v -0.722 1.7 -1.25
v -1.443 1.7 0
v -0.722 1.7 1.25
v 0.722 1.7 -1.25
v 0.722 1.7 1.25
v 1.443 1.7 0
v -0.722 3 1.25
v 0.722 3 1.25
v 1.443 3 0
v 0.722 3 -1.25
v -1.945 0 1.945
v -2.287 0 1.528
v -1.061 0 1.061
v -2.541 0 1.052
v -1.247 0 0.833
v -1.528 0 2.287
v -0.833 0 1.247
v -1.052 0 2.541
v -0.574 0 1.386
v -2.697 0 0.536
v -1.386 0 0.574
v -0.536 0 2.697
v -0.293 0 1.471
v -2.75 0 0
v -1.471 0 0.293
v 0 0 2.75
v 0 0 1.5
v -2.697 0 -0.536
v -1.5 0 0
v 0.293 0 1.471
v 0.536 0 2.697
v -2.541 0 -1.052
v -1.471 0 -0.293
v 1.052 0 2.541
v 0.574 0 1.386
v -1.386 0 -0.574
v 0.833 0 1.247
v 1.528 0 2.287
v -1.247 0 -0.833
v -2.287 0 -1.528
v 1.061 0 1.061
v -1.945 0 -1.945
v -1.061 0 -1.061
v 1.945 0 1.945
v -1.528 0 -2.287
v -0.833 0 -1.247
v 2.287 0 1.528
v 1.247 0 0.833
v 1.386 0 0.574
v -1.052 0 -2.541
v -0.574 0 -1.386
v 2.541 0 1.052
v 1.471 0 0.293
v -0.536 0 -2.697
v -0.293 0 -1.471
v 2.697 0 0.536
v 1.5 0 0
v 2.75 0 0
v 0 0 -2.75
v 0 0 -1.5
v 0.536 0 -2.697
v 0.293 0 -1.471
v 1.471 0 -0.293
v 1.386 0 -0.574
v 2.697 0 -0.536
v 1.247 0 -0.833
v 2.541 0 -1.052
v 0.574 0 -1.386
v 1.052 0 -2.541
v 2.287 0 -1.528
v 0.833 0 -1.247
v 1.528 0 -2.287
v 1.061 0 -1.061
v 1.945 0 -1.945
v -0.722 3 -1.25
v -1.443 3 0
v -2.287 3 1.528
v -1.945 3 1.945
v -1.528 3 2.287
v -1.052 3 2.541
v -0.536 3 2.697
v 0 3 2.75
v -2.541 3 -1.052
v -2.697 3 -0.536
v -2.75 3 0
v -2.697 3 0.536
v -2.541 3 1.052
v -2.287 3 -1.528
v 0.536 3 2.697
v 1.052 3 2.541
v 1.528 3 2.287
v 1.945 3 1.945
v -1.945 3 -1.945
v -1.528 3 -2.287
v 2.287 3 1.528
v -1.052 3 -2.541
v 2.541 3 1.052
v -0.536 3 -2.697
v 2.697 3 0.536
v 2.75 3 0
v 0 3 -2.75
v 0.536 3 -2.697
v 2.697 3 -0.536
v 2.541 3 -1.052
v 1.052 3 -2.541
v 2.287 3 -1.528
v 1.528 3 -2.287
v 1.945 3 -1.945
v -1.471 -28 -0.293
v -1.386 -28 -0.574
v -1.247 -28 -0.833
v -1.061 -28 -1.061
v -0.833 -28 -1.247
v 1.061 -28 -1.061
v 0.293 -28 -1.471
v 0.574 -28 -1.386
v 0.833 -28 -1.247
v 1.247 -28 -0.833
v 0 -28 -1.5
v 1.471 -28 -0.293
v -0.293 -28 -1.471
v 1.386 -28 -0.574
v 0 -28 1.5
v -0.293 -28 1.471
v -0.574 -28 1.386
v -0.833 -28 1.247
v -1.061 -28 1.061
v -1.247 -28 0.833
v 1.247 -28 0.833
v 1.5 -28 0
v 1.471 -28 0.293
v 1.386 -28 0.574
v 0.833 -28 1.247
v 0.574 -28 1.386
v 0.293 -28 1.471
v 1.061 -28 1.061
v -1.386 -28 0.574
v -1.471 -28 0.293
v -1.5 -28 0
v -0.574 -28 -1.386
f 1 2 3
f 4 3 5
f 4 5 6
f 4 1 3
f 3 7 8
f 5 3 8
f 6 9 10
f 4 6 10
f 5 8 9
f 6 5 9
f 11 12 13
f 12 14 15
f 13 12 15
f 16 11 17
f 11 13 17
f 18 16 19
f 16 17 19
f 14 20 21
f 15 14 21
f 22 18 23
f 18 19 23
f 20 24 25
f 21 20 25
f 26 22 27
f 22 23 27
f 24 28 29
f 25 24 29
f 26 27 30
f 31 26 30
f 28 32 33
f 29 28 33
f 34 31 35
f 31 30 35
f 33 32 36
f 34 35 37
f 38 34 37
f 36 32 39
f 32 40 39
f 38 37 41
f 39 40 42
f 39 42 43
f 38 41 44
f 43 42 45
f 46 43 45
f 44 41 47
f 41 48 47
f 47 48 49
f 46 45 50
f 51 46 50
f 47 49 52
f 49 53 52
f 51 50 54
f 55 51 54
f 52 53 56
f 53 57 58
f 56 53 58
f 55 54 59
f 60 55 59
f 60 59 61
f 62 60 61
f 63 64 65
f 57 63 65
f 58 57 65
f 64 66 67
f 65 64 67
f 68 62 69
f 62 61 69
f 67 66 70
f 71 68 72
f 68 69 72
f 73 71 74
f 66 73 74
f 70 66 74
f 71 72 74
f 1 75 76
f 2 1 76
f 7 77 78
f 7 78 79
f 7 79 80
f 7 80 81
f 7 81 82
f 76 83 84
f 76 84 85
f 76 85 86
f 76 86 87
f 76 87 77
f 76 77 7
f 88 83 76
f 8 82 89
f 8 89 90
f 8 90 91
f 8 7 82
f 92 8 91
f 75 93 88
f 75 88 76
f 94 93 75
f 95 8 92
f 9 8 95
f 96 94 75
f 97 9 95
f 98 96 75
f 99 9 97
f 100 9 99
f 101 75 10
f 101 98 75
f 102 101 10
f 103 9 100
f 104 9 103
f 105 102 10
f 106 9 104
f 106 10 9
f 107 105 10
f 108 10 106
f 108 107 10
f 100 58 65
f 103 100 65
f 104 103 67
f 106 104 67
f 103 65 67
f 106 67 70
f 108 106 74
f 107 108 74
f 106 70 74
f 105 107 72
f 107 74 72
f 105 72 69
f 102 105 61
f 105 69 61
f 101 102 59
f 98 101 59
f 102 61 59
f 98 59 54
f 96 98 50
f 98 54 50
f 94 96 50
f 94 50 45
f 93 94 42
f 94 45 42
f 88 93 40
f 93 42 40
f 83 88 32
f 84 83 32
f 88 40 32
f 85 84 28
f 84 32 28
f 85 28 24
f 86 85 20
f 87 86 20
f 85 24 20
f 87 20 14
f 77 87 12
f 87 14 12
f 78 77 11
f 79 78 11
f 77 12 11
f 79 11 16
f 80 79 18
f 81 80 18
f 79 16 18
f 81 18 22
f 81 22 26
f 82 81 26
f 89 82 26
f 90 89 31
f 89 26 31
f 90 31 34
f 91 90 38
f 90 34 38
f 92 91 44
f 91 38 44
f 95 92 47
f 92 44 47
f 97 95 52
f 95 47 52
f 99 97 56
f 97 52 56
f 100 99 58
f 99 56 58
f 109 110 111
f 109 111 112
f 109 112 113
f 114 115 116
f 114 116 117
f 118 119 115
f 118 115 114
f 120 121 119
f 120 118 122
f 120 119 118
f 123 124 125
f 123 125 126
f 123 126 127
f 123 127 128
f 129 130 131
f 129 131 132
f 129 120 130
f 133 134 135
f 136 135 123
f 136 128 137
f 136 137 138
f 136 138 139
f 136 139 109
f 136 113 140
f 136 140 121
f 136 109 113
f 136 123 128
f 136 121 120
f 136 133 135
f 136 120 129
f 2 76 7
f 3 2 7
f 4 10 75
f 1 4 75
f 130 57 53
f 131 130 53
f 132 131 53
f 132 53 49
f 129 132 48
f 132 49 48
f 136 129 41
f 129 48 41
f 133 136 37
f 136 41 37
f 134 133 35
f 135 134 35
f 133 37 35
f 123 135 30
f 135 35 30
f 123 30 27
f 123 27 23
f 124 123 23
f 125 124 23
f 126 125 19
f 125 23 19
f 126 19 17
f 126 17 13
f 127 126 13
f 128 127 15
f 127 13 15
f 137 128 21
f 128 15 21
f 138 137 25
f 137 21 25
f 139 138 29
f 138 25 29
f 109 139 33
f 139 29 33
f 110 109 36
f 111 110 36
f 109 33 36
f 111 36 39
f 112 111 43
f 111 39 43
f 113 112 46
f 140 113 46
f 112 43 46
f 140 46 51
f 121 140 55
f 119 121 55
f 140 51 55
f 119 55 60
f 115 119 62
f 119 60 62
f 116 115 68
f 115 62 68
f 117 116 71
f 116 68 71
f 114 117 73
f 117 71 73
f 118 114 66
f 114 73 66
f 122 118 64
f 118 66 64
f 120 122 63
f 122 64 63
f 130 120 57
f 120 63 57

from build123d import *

# Parameters (mm, degrees)
SKETCH_1_R            = 2.75
EXTRUDE_248_DEPTH     = 3
CUT_EXTRUDE_378_DEPTH = 1.3
SKETCH_3_R            = 1.5
EXTRUDE_479_DEPTH     = 28


with BuildPart() as part:
    # 草图1 → Extrude 248 (new body)
    with BuildSketch(Plane(origin=(0, 0, 0), x_dir=(1, 0, 0), z_dir=(0, 1, 0))):
        Circle(SKETCH_1_R)
    extrude(amount=EXTRUDE_248_DEPTH)

    # 草图2 → Cut-Extrude 378 (cut)
    with BuildSketch(Plane(origin=(0, 3, 0), x_dir=(1, 0, 0), z_dir=(0, 1, 0))):
        Polygon((1.443375673, 0), (0.721687836, 1.25), (-0.721687836, 1.25), (-1.443375673, 0), (-0.721687836, -1.25), (0.721687836, -1.25), align=None)
    extrude(amount=-CUT_EXTRUDE_378_DEPTH, mode=Mode.SUBTRACT)

    # 草图3 → Extrude 479 (add)
    with BuildSketch(Plane.XZ):
        Circle(SKETCH_3_R)
    extrude(amount=EXTRUDE_479_DEPTH)


solid = part.part
